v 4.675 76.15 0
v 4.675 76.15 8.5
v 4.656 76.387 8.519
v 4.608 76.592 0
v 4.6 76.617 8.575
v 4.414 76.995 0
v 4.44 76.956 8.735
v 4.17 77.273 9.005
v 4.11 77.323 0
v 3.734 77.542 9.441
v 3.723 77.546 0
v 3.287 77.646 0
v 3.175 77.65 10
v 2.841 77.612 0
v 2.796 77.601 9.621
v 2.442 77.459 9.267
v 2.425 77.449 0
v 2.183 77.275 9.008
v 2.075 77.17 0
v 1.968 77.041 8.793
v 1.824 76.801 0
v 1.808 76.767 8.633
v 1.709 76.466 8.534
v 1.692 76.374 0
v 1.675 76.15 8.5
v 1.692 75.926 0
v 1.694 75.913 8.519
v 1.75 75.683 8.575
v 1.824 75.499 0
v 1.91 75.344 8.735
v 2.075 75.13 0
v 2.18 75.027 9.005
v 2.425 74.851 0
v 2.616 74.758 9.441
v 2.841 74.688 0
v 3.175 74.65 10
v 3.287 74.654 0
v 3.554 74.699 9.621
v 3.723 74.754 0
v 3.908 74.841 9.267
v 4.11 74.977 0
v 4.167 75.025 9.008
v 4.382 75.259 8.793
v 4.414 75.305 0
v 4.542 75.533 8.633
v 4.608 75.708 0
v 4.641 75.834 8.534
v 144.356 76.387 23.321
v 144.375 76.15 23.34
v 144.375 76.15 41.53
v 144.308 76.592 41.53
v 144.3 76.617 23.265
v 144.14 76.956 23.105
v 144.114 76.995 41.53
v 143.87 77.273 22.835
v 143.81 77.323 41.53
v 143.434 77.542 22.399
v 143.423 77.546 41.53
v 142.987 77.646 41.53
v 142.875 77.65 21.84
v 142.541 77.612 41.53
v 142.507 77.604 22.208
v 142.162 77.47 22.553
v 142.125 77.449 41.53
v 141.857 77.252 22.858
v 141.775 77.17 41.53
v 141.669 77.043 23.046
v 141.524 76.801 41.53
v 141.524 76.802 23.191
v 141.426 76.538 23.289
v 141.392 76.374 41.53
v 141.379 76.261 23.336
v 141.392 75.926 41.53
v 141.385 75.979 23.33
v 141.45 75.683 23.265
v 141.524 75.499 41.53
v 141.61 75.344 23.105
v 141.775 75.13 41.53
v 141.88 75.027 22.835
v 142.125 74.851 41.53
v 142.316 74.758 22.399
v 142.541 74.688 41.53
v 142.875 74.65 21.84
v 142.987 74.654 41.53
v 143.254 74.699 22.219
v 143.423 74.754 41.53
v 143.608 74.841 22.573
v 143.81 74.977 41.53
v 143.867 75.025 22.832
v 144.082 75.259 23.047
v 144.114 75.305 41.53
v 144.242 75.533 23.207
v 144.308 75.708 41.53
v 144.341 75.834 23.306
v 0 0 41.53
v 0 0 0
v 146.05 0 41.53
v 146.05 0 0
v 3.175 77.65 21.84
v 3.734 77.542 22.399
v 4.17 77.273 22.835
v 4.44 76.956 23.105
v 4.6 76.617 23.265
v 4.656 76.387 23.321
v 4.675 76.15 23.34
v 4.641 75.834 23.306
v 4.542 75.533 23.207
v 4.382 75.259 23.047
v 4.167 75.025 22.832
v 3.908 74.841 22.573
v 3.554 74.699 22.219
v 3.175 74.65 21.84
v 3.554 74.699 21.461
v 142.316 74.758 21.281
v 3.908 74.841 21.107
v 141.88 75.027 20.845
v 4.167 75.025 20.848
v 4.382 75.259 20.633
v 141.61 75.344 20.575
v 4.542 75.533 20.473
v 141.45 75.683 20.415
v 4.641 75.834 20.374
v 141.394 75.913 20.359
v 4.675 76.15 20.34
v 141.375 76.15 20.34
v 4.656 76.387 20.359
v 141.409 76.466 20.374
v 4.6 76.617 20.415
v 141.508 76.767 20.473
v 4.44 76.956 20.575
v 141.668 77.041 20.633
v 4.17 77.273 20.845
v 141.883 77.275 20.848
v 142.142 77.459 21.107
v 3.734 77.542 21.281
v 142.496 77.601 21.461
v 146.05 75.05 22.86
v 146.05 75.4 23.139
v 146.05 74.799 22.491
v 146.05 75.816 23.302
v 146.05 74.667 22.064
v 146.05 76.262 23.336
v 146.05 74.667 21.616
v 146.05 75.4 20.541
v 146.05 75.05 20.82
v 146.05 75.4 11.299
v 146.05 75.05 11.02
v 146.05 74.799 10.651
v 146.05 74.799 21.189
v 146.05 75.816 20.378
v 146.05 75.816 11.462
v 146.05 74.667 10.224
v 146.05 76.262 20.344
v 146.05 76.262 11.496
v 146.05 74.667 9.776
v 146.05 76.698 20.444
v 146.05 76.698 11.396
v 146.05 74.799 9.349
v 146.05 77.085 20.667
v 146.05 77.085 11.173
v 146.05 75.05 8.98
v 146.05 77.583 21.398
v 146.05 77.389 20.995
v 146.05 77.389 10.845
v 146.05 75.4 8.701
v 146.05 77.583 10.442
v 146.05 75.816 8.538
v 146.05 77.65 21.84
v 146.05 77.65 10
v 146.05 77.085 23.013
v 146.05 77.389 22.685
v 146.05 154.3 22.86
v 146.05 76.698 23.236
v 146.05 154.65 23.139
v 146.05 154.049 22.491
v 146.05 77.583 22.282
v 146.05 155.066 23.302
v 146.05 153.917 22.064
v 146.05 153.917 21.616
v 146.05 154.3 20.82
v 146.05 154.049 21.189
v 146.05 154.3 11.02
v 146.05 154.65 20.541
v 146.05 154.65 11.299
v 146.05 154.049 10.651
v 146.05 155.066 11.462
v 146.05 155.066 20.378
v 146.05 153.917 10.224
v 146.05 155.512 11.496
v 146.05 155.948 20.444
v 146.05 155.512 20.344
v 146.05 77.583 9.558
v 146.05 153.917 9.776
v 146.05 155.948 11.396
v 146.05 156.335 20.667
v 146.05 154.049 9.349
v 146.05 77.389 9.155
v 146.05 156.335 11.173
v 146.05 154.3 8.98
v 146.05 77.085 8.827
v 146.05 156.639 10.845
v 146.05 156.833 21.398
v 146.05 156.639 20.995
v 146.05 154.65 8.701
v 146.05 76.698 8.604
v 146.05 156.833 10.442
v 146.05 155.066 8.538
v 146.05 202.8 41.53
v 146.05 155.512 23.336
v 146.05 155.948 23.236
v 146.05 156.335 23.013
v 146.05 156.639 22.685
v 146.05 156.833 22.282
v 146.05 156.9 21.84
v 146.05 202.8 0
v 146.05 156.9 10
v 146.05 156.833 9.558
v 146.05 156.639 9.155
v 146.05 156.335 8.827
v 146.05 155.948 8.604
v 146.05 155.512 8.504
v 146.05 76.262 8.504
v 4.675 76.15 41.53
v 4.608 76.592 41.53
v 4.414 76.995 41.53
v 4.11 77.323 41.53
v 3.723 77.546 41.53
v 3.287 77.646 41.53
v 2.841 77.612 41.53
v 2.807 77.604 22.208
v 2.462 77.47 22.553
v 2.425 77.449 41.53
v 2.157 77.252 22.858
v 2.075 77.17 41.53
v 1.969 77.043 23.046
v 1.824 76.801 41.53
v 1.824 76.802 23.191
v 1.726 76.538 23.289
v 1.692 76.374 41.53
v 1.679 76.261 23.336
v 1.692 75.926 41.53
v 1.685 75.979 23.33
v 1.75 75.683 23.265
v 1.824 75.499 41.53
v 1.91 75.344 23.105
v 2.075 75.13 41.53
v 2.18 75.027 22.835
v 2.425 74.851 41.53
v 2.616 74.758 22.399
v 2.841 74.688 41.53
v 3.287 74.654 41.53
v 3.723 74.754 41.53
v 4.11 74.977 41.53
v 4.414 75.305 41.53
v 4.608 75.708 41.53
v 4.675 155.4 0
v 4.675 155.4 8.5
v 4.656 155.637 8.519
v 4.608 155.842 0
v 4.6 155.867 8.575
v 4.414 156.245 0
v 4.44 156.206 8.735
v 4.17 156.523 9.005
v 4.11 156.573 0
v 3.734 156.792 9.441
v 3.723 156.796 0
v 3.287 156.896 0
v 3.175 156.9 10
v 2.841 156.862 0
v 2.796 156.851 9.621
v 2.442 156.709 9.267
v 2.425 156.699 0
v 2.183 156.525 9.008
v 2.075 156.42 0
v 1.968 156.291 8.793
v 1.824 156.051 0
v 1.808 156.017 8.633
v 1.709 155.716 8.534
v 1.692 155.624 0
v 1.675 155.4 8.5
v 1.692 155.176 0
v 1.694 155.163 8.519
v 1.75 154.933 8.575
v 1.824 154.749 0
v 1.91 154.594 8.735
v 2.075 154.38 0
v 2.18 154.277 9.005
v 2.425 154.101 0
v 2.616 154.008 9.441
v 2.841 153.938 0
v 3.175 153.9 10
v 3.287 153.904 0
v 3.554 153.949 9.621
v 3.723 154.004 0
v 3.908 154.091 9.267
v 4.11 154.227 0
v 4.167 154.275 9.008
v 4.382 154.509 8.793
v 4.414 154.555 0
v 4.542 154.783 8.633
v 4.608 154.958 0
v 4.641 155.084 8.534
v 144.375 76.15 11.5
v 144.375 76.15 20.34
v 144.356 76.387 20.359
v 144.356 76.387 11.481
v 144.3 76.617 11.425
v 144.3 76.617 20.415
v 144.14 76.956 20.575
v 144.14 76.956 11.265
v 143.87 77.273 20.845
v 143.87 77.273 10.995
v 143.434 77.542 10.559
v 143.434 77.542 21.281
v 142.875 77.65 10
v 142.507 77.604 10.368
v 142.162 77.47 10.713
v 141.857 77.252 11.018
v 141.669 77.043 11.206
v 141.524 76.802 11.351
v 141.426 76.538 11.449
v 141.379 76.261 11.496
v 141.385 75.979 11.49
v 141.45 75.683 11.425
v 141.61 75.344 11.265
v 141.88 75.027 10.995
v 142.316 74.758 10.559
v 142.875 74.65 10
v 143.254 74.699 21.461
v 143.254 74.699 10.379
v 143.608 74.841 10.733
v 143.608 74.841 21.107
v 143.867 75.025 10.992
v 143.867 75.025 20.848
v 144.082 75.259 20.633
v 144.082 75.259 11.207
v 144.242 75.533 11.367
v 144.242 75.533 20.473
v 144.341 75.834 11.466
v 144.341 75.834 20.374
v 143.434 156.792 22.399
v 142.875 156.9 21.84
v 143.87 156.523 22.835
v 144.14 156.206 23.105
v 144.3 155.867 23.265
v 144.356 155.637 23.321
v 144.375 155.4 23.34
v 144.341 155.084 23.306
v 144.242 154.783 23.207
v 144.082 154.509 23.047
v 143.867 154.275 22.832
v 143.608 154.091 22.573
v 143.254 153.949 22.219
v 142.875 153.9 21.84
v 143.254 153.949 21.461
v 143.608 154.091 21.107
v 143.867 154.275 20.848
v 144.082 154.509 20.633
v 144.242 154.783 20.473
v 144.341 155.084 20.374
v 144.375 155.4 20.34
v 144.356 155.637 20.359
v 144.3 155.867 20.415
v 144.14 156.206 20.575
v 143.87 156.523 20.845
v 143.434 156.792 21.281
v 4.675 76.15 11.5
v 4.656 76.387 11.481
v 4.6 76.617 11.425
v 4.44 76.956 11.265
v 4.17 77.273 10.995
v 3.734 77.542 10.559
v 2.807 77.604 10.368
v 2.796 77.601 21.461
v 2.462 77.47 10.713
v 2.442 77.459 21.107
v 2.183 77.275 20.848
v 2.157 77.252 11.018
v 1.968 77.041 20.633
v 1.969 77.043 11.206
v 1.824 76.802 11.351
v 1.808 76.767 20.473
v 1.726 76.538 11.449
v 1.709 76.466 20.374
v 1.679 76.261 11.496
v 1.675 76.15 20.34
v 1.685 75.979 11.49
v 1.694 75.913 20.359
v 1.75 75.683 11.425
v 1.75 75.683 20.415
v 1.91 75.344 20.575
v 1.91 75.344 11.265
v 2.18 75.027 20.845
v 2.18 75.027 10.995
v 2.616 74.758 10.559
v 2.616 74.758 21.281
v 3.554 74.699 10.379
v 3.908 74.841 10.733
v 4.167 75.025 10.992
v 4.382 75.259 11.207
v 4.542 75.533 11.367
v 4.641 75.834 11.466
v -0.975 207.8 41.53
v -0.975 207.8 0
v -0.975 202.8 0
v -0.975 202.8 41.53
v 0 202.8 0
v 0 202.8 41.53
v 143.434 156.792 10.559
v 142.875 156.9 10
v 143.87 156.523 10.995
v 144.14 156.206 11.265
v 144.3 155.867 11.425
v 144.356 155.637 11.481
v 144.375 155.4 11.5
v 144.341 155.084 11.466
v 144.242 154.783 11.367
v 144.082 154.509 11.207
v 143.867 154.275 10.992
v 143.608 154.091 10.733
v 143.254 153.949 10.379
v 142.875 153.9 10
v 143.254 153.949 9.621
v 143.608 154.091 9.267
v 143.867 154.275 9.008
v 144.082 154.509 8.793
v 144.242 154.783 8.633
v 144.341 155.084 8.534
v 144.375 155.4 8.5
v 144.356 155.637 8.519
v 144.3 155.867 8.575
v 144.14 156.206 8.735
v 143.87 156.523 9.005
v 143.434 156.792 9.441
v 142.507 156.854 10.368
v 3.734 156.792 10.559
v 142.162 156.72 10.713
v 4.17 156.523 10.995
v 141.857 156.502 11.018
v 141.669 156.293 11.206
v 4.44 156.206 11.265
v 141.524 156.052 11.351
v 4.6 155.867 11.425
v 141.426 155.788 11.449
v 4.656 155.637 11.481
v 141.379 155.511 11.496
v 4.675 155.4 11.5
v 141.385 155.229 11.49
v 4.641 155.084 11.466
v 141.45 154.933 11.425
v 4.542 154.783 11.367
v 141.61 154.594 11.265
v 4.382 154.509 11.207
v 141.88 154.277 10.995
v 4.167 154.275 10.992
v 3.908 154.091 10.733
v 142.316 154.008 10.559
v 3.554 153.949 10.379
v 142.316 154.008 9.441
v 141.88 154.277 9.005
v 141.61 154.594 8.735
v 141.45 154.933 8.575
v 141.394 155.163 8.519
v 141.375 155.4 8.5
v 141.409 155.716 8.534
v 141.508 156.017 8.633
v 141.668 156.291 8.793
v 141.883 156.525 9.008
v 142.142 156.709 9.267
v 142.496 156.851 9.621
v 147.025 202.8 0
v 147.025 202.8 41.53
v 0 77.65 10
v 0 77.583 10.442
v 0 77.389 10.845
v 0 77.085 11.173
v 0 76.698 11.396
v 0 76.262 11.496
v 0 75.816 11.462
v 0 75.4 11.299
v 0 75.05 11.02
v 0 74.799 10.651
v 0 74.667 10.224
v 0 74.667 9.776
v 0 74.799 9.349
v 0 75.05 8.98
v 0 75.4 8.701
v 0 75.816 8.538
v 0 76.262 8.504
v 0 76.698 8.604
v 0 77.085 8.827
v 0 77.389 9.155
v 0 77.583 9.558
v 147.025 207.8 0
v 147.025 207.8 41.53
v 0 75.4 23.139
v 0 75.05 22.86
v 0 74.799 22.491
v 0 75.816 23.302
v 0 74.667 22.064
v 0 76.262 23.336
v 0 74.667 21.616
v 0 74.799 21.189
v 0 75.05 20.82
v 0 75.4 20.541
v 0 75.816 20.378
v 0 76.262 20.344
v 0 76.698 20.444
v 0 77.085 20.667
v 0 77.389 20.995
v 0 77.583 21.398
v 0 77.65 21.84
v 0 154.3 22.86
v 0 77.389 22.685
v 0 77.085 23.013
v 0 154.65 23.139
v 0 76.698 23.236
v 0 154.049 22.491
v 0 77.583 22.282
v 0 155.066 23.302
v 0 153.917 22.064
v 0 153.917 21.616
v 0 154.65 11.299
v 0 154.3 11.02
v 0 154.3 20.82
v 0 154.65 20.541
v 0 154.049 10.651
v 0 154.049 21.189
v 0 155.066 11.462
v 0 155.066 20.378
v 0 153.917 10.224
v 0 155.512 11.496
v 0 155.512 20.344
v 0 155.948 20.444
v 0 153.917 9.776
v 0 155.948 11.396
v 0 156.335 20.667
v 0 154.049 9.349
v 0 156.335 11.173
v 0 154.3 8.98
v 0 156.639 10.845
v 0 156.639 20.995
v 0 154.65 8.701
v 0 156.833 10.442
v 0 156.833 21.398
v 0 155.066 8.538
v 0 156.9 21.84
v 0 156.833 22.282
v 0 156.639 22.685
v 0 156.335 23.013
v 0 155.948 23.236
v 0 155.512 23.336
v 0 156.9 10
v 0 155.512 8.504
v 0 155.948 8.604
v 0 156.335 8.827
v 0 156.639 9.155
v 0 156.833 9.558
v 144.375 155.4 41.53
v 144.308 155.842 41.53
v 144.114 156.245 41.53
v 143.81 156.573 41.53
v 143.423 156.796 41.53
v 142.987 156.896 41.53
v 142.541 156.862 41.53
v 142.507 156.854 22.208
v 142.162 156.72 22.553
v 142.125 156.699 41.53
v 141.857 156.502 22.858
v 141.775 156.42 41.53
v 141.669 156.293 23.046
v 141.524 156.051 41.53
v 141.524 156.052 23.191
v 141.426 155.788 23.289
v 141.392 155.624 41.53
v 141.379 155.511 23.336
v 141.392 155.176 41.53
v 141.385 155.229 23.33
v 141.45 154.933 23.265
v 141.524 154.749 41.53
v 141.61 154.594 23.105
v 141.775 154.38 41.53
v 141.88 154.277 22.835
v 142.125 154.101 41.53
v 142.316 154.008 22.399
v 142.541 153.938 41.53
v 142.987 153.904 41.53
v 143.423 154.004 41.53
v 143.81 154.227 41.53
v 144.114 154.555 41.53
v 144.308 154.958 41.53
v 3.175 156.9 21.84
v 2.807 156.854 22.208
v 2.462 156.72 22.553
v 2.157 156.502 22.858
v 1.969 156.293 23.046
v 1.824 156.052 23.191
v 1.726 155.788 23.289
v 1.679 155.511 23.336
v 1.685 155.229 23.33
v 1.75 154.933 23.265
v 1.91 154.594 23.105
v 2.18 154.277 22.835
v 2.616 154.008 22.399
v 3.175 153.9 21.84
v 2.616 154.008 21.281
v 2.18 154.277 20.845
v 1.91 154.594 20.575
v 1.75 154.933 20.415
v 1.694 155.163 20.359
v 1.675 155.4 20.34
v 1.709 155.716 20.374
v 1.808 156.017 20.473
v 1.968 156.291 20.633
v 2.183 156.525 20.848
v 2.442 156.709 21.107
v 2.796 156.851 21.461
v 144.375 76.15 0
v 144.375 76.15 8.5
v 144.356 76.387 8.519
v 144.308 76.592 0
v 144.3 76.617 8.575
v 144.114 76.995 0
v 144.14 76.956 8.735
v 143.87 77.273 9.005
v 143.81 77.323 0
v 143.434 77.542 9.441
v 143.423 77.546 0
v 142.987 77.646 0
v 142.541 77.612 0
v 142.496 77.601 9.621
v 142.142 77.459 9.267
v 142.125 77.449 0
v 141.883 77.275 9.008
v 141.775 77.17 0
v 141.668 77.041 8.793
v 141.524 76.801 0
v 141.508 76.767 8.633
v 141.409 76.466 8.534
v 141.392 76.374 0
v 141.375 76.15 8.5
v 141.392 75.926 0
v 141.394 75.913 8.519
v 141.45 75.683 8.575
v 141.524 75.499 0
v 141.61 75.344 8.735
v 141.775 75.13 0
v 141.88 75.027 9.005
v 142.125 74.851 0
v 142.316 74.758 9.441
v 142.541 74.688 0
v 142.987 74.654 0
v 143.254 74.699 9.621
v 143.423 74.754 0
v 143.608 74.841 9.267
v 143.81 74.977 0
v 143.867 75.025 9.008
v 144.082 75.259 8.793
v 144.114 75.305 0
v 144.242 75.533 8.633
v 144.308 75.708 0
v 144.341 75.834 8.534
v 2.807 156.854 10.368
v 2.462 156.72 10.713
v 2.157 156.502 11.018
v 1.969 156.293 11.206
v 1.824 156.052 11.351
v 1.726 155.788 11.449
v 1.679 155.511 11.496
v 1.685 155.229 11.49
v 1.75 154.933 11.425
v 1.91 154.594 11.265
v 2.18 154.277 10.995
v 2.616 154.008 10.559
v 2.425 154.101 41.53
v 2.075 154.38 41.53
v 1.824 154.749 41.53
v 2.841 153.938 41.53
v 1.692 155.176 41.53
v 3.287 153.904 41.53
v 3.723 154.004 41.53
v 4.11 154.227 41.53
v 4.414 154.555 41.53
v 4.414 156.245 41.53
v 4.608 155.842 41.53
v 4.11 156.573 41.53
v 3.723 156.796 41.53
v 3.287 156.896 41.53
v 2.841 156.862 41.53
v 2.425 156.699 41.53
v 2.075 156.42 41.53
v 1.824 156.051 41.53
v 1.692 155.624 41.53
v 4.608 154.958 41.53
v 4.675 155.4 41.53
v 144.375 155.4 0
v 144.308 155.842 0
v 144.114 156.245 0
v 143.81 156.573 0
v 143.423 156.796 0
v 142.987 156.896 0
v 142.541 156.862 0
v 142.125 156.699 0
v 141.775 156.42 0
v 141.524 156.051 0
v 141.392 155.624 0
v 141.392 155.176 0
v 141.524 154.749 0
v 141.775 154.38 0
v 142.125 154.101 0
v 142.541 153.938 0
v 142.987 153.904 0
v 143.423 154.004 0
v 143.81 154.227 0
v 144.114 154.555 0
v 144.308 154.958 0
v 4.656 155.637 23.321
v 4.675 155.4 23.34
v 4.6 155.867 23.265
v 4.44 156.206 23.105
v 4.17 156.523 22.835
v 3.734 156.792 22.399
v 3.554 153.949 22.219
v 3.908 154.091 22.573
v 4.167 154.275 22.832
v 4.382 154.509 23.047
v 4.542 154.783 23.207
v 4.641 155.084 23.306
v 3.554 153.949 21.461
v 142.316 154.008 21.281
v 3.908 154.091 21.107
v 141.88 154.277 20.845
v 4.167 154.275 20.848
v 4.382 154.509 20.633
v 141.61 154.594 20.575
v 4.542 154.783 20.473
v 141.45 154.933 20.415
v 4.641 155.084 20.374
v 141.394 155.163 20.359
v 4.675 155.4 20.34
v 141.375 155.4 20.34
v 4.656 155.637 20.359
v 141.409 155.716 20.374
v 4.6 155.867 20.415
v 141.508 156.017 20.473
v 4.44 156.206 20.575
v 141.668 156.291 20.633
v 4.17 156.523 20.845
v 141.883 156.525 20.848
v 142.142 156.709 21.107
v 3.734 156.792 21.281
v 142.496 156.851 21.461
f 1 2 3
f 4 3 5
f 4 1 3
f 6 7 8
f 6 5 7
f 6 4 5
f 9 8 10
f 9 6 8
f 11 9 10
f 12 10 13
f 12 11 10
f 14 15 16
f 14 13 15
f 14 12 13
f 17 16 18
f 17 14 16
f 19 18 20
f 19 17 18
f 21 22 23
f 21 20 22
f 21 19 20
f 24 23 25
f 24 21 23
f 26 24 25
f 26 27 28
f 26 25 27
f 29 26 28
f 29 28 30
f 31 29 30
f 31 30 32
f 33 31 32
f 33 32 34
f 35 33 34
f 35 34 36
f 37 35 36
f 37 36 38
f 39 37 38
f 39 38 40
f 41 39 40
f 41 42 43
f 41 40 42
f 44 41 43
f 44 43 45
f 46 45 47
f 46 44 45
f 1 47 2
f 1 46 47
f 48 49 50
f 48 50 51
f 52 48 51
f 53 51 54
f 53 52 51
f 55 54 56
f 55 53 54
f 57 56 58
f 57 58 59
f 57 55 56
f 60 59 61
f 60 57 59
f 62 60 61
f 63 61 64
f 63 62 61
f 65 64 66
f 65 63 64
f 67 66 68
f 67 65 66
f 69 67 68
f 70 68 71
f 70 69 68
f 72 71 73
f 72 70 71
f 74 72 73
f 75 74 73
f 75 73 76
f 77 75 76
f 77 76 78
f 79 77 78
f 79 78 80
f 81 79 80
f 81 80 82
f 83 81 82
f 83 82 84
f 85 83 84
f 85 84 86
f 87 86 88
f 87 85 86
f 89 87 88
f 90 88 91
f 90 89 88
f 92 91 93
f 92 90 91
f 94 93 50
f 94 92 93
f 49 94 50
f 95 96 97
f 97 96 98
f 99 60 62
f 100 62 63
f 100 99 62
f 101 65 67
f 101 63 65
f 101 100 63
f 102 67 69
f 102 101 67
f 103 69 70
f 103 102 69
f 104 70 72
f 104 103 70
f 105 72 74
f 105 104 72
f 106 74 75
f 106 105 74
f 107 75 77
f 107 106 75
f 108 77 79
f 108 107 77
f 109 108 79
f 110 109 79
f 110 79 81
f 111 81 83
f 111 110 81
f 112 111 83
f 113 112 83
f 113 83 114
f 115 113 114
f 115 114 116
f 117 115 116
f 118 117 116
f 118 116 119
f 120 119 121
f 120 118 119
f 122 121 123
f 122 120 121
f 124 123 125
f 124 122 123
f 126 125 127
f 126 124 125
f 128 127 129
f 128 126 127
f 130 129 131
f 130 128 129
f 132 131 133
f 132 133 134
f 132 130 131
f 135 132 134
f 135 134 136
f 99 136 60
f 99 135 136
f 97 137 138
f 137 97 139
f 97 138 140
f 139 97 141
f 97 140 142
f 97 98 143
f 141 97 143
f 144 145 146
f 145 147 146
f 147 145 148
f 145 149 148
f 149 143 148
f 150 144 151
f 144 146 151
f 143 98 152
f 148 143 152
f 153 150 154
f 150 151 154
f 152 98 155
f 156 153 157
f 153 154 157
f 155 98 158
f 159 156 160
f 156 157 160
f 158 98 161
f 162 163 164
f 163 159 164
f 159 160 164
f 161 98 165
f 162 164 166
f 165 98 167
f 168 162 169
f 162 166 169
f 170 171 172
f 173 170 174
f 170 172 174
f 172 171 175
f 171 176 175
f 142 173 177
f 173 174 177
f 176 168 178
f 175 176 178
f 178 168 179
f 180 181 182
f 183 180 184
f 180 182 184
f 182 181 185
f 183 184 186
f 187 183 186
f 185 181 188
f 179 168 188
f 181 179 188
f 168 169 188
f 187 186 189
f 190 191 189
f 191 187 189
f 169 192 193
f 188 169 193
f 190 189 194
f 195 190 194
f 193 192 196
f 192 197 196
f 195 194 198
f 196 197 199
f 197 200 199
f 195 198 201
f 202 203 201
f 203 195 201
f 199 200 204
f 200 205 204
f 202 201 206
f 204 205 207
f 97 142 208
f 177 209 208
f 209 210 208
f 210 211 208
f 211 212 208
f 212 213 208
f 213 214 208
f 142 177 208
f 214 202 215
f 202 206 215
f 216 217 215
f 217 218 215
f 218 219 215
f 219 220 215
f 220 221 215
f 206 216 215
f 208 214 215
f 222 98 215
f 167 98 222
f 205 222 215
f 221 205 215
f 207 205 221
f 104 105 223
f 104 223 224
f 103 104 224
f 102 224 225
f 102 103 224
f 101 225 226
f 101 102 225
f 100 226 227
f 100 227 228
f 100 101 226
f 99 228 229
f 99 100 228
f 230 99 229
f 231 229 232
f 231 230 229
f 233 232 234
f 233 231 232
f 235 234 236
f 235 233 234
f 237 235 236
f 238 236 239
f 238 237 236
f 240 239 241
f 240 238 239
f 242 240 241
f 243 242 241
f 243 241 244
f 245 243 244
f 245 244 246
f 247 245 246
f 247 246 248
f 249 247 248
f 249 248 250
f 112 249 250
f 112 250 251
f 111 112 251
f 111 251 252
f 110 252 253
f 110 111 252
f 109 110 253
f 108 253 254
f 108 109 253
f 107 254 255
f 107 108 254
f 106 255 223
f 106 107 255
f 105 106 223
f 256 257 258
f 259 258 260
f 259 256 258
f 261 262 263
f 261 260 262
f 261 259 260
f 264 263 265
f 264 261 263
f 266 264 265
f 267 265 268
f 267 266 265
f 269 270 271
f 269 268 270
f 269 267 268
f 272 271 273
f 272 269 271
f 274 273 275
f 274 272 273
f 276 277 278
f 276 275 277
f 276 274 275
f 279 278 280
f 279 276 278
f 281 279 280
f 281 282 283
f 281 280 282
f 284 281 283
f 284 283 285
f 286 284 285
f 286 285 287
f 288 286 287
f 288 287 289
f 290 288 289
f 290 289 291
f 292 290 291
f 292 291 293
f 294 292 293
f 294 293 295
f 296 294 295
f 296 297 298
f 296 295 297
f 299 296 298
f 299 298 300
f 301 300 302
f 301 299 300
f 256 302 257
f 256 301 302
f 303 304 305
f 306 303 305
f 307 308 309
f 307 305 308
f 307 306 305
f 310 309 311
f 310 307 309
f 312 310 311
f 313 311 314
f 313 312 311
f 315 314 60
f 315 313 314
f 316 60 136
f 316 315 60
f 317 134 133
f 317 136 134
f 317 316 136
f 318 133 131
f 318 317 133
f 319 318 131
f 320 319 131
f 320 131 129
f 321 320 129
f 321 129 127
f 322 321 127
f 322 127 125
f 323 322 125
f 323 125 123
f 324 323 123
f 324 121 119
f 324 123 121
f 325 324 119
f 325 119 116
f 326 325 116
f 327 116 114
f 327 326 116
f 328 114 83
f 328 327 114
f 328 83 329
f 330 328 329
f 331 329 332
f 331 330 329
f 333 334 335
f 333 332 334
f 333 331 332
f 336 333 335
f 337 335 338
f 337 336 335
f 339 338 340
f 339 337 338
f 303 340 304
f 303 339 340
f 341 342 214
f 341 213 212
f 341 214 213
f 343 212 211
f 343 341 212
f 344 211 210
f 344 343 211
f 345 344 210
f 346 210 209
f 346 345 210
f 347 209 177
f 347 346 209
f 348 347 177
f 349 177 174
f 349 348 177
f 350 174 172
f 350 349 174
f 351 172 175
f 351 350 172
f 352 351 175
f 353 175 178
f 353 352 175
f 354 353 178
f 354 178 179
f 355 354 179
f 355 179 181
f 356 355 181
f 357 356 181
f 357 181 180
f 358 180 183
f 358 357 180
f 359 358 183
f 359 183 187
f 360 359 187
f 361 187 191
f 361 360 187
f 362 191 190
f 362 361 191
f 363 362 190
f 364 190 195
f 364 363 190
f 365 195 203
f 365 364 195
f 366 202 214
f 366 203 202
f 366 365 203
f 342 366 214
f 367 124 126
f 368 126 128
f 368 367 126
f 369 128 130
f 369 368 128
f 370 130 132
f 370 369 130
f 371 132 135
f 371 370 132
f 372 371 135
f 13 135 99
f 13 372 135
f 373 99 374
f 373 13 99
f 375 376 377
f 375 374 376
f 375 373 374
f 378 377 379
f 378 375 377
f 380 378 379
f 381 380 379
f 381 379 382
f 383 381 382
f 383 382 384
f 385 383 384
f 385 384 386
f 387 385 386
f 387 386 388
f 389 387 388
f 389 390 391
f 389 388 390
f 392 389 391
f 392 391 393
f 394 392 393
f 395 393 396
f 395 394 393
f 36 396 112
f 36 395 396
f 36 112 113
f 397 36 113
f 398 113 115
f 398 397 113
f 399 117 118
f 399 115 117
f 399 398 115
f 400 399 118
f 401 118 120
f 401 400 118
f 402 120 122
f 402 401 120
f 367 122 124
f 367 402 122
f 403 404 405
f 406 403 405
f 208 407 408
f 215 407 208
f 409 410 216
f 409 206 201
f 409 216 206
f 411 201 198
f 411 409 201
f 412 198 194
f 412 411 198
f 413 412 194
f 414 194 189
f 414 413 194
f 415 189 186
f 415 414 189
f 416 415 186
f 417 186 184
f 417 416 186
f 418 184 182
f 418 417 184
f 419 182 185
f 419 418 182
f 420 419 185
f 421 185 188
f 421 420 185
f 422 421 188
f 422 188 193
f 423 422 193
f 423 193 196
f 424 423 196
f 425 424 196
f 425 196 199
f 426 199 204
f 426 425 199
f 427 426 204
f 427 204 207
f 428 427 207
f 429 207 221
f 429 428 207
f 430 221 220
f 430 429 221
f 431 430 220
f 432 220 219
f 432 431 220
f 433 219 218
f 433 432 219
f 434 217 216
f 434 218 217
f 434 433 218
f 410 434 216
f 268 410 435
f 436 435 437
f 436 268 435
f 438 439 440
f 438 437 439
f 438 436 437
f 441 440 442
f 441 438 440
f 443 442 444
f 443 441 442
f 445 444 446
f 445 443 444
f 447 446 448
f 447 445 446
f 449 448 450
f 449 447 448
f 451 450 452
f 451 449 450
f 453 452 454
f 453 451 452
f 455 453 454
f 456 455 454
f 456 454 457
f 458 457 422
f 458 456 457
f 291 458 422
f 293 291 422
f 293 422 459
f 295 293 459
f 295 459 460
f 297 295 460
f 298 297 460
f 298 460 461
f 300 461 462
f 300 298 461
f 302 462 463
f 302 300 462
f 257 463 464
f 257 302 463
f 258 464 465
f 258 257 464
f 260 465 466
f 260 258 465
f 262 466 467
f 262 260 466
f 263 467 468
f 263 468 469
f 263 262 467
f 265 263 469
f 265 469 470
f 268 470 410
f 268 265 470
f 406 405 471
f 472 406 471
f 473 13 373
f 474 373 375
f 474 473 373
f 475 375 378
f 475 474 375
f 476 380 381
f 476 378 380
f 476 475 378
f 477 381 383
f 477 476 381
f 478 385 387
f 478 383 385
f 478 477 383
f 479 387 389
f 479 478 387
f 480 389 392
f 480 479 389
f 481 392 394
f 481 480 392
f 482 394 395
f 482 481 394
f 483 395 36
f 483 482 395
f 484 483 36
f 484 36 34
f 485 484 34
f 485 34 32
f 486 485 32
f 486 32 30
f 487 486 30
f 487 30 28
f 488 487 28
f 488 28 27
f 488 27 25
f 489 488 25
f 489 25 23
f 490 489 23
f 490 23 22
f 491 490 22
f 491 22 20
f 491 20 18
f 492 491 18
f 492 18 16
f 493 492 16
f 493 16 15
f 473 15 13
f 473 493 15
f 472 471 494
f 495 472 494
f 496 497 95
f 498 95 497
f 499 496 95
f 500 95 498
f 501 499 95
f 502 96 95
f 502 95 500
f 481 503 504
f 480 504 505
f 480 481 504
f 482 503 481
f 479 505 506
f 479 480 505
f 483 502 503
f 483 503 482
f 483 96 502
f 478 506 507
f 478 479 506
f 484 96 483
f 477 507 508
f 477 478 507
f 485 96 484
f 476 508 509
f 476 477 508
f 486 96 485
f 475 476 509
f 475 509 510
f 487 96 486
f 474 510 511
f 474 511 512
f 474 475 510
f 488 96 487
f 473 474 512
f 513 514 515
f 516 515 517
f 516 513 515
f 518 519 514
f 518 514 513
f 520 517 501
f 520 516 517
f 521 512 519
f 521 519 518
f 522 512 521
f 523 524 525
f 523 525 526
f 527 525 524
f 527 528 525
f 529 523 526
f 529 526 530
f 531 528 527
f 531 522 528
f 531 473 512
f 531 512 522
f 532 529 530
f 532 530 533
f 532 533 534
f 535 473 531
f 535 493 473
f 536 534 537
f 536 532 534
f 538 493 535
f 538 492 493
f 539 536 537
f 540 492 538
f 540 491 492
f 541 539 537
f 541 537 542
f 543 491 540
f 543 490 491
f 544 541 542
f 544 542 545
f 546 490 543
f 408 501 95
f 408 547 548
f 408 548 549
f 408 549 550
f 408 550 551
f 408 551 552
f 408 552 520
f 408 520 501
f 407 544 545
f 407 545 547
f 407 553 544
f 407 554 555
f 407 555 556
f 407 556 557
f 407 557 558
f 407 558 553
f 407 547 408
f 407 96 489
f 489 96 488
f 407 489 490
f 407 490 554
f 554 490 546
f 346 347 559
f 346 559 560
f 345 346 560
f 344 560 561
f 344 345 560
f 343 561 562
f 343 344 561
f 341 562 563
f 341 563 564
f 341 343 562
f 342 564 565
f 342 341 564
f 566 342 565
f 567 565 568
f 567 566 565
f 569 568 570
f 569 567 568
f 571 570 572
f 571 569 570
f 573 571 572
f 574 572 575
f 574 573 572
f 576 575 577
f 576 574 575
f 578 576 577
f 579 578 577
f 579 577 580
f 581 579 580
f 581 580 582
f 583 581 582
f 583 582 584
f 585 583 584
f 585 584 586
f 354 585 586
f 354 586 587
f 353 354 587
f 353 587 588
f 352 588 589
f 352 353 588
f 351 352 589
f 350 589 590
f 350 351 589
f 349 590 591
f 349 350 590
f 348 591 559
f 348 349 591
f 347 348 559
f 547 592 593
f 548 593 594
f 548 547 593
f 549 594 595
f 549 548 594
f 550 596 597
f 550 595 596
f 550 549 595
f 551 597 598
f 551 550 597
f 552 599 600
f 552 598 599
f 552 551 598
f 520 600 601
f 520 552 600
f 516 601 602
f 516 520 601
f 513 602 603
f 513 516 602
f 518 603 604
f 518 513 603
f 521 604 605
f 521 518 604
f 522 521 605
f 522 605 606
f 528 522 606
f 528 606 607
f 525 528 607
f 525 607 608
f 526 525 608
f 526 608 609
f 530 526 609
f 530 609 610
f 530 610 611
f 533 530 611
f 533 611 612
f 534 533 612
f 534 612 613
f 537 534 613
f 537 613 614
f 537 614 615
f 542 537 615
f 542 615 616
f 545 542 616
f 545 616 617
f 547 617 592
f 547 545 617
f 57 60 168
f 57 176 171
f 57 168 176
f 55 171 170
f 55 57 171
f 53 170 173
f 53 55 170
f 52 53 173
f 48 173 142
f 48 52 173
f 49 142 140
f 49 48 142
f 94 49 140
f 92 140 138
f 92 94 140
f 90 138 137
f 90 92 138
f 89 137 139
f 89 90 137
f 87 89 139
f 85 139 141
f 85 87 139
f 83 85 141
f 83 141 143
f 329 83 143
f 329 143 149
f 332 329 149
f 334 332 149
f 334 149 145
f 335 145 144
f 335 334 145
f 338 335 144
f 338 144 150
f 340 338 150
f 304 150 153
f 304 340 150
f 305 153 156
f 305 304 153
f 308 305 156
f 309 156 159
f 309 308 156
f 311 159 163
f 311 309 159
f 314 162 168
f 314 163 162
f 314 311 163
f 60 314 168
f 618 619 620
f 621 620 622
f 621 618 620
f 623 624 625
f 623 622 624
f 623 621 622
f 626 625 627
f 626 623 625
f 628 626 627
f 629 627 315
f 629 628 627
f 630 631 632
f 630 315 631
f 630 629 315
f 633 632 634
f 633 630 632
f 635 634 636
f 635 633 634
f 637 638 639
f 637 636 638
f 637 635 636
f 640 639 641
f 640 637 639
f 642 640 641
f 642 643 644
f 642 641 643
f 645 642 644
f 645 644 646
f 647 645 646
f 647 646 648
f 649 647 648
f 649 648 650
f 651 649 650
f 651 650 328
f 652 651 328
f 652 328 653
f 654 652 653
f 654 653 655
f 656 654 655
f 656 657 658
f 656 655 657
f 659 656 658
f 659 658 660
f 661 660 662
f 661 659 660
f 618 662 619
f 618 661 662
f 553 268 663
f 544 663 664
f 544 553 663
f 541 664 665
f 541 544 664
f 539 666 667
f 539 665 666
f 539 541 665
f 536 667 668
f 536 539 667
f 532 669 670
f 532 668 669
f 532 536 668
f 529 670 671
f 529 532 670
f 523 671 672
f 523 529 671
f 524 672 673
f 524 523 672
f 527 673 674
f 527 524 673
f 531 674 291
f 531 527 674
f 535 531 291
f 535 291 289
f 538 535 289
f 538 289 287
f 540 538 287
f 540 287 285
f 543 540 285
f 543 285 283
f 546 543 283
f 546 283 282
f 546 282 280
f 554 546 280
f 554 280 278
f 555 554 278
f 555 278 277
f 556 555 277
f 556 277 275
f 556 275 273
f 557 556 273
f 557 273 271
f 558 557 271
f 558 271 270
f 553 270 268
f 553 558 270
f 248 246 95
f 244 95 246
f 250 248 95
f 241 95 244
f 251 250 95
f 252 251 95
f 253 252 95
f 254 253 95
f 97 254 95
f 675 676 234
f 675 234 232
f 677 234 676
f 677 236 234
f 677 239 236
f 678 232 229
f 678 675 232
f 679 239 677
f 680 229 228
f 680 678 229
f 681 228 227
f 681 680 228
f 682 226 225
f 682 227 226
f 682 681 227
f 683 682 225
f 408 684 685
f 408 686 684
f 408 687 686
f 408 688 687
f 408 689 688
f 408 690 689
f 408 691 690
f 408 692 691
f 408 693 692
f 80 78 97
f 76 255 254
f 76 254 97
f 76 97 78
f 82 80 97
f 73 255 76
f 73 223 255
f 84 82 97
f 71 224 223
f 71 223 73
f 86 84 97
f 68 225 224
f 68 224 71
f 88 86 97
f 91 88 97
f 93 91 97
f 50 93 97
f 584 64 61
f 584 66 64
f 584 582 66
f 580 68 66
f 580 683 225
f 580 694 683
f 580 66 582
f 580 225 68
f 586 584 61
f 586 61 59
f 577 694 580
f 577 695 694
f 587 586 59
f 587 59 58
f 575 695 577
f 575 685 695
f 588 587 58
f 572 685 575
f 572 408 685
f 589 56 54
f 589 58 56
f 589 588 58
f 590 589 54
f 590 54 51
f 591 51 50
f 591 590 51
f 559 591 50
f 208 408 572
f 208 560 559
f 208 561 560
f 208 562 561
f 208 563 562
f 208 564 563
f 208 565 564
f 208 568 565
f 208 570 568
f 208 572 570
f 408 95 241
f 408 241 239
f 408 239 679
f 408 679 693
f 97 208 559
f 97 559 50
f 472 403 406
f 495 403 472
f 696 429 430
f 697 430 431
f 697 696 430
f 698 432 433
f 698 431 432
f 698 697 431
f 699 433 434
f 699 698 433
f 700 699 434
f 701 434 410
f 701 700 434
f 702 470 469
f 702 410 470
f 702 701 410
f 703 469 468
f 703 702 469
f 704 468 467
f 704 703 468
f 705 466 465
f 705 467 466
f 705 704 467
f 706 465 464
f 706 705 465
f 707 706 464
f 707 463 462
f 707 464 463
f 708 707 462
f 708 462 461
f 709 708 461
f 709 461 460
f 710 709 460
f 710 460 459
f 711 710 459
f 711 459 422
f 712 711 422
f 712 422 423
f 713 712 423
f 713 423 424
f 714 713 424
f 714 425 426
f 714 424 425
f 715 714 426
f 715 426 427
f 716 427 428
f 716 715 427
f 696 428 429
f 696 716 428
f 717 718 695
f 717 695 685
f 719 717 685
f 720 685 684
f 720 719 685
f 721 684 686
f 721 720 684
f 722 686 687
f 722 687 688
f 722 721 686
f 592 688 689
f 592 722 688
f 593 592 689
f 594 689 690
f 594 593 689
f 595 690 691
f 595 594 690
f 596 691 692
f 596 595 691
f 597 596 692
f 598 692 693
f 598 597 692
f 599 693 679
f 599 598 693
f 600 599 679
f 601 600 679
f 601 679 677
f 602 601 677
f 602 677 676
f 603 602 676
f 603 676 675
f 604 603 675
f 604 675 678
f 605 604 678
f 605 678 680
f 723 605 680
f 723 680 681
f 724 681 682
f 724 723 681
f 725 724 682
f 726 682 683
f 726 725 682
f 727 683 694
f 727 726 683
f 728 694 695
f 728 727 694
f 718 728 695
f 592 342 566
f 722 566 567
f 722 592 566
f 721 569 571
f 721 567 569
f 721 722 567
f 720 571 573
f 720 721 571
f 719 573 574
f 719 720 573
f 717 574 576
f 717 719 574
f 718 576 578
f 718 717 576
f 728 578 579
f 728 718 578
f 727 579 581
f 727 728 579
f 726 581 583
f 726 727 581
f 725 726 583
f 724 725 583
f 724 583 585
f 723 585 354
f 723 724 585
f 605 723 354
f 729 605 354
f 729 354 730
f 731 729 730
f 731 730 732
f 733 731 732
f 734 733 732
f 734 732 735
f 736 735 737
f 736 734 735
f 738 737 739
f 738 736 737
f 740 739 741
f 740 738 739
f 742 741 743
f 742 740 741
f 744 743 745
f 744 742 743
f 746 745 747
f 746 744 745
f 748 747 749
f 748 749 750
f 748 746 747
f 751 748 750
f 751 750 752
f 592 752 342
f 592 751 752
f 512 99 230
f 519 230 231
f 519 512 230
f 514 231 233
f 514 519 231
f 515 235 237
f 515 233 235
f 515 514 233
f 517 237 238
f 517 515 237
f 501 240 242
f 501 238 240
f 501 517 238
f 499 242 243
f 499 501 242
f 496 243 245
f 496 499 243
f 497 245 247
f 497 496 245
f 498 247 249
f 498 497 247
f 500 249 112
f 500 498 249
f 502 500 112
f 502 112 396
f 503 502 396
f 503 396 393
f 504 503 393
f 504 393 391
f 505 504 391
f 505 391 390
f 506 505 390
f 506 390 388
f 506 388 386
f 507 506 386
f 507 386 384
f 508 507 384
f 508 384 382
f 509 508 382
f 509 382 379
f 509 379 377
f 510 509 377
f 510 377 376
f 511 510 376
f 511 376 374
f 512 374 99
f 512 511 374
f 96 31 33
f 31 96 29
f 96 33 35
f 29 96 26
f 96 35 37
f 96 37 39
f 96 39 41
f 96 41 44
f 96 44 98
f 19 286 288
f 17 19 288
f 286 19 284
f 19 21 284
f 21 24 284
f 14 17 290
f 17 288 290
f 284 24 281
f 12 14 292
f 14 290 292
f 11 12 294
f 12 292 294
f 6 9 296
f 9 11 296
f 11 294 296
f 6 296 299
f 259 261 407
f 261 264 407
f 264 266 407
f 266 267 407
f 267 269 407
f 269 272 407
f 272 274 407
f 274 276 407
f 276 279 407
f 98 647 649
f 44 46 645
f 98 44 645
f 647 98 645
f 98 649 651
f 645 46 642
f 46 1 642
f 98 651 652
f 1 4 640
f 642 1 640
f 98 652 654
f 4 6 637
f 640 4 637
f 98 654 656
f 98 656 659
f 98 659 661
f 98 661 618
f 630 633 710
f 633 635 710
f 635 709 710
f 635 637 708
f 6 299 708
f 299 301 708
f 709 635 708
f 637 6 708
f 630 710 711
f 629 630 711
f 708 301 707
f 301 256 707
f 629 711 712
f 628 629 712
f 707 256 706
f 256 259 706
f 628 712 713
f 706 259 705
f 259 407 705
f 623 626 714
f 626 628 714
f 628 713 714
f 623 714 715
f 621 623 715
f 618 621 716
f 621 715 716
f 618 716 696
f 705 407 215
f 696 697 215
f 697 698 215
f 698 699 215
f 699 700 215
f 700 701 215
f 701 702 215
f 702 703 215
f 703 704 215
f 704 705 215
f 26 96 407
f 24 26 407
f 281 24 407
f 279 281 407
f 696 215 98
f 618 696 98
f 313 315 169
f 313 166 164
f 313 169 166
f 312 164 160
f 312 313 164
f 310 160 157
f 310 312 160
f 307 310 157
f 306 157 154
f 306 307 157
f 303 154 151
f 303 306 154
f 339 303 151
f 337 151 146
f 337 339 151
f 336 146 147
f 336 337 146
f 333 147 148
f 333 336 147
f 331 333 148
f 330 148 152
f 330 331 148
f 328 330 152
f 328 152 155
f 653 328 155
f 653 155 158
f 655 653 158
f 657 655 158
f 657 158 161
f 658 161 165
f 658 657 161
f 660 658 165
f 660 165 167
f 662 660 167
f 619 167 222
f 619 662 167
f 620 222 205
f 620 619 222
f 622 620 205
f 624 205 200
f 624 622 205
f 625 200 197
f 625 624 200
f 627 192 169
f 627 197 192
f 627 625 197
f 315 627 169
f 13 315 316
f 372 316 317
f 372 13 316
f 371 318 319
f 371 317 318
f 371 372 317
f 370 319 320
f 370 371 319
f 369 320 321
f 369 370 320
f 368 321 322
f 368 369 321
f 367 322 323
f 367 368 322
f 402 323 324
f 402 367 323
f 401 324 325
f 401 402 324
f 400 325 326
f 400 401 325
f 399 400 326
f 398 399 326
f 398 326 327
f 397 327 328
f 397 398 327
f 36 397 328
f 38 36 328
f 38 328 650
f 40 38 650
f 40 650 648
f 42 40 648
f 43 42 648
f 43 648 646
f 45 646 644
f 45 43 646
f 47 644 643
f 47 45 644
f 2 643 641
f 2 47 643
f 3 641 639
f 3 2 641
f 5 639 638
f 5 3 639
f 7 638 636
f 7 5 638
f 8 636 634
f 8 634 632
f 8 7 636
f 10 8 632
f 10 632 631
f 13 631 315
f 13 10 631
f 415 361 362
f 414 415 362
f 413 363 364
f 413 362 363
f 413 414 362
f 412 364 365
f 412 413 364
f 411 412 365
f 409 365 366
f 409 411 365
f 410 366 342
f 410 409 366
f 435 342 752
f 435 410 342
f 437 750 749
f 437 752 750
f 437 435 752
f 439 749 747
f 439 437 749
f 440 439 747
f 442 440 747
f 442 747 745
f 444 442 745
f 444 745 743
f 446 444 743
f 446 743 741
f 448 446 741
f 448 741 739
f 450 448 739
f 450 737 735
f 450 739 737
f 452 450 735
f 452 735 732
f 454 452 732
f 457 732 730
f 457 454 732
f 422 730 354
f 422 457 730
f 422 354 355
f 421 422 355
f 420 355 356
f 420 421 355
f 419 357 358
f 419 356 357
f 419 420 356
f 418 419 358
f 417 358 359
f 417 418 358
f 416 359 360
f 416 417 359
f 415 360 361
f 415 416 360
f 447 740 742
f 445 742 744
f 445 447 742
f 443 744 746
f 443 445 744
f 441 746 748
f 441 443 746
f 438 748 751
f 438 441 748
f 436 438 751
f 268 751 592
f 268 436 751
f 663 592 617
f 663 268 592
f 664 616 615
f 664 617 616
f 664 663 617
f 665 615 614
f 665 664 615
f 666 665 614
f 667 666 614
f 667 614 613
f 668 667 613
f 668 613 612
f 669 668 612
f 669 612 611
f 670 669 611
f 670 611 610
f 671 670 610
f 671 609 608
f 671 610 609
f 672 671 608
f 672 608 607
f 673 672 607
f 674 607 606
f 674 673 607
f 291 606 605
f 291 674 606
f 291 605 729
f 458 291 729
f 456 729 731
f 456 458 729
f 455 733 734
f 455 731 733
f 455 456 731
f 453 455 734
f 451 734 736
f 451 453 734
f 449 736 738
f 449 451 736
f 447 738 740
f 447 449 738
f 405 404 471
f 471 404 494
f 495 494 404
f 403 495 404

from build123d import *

# Parameters (mm, degrees)
F0_W     = 146.05
F0_H     = 202.8
F0_R     = 1.5
F2_DEPTH = 41.53
F3_DEPTH = 41.53
F1_R     = 1.5
F4_DEPTH = 147.026


with BuildPart() as f2:
    # F0 (on Top) → F2 (new body, through all)
    with BuildSketch(Plane.XY):
        with Locations((73.025, 101.4)):
            Rectangle(F0_W, F0_H)
        with Locations((3.175, 76.15)):
            Circle(F0_R, mode=Mode.SUBTRACT)
        with Locations((142.875, 76.15)):
            Circle(F0_R, mode=Mode.SUBTRACT)
        with Locations((3.175, 155.4)):
            Circle(F0_R, mode=Mode.SUBTRACT)
        with Locations((142.875, 155.4)):
            Circle(F0_R, mode=Mode.SUBTRACT)
    extrude(amount=F2_DEPTH)

    # F1 (on Right) → F4 (cut, through all)
    with BuildSketch(Plane.YZ):
        with Locations((155.4, 21.84)):
            Circle(F1_R)
        with Locations((155.4, 10)):
            Circle(F1_R)
        with Locations((76.15, 21.84)):
            Circle(F1_R)
        with Locations((76.15, 10)):
            Circle(F1_R)
    extrude(amount=F4_DEPTH, mode=Mode.SUBTRACT)


with BuildPart() as f3:
    # F0 (on Top) → F3 (new body, through all)
    with BuildSketch(Plane.XY):
        Polygon((-0.975, 202.8), (0, 202.8), (146.05, 202.8), (147.025, 202.8), (147.025, 207.8), (-0.975, 207.8), align=None)
    extrude(amount=F3_DEPTH)


solid = Compound([f2.part, f3.part])
